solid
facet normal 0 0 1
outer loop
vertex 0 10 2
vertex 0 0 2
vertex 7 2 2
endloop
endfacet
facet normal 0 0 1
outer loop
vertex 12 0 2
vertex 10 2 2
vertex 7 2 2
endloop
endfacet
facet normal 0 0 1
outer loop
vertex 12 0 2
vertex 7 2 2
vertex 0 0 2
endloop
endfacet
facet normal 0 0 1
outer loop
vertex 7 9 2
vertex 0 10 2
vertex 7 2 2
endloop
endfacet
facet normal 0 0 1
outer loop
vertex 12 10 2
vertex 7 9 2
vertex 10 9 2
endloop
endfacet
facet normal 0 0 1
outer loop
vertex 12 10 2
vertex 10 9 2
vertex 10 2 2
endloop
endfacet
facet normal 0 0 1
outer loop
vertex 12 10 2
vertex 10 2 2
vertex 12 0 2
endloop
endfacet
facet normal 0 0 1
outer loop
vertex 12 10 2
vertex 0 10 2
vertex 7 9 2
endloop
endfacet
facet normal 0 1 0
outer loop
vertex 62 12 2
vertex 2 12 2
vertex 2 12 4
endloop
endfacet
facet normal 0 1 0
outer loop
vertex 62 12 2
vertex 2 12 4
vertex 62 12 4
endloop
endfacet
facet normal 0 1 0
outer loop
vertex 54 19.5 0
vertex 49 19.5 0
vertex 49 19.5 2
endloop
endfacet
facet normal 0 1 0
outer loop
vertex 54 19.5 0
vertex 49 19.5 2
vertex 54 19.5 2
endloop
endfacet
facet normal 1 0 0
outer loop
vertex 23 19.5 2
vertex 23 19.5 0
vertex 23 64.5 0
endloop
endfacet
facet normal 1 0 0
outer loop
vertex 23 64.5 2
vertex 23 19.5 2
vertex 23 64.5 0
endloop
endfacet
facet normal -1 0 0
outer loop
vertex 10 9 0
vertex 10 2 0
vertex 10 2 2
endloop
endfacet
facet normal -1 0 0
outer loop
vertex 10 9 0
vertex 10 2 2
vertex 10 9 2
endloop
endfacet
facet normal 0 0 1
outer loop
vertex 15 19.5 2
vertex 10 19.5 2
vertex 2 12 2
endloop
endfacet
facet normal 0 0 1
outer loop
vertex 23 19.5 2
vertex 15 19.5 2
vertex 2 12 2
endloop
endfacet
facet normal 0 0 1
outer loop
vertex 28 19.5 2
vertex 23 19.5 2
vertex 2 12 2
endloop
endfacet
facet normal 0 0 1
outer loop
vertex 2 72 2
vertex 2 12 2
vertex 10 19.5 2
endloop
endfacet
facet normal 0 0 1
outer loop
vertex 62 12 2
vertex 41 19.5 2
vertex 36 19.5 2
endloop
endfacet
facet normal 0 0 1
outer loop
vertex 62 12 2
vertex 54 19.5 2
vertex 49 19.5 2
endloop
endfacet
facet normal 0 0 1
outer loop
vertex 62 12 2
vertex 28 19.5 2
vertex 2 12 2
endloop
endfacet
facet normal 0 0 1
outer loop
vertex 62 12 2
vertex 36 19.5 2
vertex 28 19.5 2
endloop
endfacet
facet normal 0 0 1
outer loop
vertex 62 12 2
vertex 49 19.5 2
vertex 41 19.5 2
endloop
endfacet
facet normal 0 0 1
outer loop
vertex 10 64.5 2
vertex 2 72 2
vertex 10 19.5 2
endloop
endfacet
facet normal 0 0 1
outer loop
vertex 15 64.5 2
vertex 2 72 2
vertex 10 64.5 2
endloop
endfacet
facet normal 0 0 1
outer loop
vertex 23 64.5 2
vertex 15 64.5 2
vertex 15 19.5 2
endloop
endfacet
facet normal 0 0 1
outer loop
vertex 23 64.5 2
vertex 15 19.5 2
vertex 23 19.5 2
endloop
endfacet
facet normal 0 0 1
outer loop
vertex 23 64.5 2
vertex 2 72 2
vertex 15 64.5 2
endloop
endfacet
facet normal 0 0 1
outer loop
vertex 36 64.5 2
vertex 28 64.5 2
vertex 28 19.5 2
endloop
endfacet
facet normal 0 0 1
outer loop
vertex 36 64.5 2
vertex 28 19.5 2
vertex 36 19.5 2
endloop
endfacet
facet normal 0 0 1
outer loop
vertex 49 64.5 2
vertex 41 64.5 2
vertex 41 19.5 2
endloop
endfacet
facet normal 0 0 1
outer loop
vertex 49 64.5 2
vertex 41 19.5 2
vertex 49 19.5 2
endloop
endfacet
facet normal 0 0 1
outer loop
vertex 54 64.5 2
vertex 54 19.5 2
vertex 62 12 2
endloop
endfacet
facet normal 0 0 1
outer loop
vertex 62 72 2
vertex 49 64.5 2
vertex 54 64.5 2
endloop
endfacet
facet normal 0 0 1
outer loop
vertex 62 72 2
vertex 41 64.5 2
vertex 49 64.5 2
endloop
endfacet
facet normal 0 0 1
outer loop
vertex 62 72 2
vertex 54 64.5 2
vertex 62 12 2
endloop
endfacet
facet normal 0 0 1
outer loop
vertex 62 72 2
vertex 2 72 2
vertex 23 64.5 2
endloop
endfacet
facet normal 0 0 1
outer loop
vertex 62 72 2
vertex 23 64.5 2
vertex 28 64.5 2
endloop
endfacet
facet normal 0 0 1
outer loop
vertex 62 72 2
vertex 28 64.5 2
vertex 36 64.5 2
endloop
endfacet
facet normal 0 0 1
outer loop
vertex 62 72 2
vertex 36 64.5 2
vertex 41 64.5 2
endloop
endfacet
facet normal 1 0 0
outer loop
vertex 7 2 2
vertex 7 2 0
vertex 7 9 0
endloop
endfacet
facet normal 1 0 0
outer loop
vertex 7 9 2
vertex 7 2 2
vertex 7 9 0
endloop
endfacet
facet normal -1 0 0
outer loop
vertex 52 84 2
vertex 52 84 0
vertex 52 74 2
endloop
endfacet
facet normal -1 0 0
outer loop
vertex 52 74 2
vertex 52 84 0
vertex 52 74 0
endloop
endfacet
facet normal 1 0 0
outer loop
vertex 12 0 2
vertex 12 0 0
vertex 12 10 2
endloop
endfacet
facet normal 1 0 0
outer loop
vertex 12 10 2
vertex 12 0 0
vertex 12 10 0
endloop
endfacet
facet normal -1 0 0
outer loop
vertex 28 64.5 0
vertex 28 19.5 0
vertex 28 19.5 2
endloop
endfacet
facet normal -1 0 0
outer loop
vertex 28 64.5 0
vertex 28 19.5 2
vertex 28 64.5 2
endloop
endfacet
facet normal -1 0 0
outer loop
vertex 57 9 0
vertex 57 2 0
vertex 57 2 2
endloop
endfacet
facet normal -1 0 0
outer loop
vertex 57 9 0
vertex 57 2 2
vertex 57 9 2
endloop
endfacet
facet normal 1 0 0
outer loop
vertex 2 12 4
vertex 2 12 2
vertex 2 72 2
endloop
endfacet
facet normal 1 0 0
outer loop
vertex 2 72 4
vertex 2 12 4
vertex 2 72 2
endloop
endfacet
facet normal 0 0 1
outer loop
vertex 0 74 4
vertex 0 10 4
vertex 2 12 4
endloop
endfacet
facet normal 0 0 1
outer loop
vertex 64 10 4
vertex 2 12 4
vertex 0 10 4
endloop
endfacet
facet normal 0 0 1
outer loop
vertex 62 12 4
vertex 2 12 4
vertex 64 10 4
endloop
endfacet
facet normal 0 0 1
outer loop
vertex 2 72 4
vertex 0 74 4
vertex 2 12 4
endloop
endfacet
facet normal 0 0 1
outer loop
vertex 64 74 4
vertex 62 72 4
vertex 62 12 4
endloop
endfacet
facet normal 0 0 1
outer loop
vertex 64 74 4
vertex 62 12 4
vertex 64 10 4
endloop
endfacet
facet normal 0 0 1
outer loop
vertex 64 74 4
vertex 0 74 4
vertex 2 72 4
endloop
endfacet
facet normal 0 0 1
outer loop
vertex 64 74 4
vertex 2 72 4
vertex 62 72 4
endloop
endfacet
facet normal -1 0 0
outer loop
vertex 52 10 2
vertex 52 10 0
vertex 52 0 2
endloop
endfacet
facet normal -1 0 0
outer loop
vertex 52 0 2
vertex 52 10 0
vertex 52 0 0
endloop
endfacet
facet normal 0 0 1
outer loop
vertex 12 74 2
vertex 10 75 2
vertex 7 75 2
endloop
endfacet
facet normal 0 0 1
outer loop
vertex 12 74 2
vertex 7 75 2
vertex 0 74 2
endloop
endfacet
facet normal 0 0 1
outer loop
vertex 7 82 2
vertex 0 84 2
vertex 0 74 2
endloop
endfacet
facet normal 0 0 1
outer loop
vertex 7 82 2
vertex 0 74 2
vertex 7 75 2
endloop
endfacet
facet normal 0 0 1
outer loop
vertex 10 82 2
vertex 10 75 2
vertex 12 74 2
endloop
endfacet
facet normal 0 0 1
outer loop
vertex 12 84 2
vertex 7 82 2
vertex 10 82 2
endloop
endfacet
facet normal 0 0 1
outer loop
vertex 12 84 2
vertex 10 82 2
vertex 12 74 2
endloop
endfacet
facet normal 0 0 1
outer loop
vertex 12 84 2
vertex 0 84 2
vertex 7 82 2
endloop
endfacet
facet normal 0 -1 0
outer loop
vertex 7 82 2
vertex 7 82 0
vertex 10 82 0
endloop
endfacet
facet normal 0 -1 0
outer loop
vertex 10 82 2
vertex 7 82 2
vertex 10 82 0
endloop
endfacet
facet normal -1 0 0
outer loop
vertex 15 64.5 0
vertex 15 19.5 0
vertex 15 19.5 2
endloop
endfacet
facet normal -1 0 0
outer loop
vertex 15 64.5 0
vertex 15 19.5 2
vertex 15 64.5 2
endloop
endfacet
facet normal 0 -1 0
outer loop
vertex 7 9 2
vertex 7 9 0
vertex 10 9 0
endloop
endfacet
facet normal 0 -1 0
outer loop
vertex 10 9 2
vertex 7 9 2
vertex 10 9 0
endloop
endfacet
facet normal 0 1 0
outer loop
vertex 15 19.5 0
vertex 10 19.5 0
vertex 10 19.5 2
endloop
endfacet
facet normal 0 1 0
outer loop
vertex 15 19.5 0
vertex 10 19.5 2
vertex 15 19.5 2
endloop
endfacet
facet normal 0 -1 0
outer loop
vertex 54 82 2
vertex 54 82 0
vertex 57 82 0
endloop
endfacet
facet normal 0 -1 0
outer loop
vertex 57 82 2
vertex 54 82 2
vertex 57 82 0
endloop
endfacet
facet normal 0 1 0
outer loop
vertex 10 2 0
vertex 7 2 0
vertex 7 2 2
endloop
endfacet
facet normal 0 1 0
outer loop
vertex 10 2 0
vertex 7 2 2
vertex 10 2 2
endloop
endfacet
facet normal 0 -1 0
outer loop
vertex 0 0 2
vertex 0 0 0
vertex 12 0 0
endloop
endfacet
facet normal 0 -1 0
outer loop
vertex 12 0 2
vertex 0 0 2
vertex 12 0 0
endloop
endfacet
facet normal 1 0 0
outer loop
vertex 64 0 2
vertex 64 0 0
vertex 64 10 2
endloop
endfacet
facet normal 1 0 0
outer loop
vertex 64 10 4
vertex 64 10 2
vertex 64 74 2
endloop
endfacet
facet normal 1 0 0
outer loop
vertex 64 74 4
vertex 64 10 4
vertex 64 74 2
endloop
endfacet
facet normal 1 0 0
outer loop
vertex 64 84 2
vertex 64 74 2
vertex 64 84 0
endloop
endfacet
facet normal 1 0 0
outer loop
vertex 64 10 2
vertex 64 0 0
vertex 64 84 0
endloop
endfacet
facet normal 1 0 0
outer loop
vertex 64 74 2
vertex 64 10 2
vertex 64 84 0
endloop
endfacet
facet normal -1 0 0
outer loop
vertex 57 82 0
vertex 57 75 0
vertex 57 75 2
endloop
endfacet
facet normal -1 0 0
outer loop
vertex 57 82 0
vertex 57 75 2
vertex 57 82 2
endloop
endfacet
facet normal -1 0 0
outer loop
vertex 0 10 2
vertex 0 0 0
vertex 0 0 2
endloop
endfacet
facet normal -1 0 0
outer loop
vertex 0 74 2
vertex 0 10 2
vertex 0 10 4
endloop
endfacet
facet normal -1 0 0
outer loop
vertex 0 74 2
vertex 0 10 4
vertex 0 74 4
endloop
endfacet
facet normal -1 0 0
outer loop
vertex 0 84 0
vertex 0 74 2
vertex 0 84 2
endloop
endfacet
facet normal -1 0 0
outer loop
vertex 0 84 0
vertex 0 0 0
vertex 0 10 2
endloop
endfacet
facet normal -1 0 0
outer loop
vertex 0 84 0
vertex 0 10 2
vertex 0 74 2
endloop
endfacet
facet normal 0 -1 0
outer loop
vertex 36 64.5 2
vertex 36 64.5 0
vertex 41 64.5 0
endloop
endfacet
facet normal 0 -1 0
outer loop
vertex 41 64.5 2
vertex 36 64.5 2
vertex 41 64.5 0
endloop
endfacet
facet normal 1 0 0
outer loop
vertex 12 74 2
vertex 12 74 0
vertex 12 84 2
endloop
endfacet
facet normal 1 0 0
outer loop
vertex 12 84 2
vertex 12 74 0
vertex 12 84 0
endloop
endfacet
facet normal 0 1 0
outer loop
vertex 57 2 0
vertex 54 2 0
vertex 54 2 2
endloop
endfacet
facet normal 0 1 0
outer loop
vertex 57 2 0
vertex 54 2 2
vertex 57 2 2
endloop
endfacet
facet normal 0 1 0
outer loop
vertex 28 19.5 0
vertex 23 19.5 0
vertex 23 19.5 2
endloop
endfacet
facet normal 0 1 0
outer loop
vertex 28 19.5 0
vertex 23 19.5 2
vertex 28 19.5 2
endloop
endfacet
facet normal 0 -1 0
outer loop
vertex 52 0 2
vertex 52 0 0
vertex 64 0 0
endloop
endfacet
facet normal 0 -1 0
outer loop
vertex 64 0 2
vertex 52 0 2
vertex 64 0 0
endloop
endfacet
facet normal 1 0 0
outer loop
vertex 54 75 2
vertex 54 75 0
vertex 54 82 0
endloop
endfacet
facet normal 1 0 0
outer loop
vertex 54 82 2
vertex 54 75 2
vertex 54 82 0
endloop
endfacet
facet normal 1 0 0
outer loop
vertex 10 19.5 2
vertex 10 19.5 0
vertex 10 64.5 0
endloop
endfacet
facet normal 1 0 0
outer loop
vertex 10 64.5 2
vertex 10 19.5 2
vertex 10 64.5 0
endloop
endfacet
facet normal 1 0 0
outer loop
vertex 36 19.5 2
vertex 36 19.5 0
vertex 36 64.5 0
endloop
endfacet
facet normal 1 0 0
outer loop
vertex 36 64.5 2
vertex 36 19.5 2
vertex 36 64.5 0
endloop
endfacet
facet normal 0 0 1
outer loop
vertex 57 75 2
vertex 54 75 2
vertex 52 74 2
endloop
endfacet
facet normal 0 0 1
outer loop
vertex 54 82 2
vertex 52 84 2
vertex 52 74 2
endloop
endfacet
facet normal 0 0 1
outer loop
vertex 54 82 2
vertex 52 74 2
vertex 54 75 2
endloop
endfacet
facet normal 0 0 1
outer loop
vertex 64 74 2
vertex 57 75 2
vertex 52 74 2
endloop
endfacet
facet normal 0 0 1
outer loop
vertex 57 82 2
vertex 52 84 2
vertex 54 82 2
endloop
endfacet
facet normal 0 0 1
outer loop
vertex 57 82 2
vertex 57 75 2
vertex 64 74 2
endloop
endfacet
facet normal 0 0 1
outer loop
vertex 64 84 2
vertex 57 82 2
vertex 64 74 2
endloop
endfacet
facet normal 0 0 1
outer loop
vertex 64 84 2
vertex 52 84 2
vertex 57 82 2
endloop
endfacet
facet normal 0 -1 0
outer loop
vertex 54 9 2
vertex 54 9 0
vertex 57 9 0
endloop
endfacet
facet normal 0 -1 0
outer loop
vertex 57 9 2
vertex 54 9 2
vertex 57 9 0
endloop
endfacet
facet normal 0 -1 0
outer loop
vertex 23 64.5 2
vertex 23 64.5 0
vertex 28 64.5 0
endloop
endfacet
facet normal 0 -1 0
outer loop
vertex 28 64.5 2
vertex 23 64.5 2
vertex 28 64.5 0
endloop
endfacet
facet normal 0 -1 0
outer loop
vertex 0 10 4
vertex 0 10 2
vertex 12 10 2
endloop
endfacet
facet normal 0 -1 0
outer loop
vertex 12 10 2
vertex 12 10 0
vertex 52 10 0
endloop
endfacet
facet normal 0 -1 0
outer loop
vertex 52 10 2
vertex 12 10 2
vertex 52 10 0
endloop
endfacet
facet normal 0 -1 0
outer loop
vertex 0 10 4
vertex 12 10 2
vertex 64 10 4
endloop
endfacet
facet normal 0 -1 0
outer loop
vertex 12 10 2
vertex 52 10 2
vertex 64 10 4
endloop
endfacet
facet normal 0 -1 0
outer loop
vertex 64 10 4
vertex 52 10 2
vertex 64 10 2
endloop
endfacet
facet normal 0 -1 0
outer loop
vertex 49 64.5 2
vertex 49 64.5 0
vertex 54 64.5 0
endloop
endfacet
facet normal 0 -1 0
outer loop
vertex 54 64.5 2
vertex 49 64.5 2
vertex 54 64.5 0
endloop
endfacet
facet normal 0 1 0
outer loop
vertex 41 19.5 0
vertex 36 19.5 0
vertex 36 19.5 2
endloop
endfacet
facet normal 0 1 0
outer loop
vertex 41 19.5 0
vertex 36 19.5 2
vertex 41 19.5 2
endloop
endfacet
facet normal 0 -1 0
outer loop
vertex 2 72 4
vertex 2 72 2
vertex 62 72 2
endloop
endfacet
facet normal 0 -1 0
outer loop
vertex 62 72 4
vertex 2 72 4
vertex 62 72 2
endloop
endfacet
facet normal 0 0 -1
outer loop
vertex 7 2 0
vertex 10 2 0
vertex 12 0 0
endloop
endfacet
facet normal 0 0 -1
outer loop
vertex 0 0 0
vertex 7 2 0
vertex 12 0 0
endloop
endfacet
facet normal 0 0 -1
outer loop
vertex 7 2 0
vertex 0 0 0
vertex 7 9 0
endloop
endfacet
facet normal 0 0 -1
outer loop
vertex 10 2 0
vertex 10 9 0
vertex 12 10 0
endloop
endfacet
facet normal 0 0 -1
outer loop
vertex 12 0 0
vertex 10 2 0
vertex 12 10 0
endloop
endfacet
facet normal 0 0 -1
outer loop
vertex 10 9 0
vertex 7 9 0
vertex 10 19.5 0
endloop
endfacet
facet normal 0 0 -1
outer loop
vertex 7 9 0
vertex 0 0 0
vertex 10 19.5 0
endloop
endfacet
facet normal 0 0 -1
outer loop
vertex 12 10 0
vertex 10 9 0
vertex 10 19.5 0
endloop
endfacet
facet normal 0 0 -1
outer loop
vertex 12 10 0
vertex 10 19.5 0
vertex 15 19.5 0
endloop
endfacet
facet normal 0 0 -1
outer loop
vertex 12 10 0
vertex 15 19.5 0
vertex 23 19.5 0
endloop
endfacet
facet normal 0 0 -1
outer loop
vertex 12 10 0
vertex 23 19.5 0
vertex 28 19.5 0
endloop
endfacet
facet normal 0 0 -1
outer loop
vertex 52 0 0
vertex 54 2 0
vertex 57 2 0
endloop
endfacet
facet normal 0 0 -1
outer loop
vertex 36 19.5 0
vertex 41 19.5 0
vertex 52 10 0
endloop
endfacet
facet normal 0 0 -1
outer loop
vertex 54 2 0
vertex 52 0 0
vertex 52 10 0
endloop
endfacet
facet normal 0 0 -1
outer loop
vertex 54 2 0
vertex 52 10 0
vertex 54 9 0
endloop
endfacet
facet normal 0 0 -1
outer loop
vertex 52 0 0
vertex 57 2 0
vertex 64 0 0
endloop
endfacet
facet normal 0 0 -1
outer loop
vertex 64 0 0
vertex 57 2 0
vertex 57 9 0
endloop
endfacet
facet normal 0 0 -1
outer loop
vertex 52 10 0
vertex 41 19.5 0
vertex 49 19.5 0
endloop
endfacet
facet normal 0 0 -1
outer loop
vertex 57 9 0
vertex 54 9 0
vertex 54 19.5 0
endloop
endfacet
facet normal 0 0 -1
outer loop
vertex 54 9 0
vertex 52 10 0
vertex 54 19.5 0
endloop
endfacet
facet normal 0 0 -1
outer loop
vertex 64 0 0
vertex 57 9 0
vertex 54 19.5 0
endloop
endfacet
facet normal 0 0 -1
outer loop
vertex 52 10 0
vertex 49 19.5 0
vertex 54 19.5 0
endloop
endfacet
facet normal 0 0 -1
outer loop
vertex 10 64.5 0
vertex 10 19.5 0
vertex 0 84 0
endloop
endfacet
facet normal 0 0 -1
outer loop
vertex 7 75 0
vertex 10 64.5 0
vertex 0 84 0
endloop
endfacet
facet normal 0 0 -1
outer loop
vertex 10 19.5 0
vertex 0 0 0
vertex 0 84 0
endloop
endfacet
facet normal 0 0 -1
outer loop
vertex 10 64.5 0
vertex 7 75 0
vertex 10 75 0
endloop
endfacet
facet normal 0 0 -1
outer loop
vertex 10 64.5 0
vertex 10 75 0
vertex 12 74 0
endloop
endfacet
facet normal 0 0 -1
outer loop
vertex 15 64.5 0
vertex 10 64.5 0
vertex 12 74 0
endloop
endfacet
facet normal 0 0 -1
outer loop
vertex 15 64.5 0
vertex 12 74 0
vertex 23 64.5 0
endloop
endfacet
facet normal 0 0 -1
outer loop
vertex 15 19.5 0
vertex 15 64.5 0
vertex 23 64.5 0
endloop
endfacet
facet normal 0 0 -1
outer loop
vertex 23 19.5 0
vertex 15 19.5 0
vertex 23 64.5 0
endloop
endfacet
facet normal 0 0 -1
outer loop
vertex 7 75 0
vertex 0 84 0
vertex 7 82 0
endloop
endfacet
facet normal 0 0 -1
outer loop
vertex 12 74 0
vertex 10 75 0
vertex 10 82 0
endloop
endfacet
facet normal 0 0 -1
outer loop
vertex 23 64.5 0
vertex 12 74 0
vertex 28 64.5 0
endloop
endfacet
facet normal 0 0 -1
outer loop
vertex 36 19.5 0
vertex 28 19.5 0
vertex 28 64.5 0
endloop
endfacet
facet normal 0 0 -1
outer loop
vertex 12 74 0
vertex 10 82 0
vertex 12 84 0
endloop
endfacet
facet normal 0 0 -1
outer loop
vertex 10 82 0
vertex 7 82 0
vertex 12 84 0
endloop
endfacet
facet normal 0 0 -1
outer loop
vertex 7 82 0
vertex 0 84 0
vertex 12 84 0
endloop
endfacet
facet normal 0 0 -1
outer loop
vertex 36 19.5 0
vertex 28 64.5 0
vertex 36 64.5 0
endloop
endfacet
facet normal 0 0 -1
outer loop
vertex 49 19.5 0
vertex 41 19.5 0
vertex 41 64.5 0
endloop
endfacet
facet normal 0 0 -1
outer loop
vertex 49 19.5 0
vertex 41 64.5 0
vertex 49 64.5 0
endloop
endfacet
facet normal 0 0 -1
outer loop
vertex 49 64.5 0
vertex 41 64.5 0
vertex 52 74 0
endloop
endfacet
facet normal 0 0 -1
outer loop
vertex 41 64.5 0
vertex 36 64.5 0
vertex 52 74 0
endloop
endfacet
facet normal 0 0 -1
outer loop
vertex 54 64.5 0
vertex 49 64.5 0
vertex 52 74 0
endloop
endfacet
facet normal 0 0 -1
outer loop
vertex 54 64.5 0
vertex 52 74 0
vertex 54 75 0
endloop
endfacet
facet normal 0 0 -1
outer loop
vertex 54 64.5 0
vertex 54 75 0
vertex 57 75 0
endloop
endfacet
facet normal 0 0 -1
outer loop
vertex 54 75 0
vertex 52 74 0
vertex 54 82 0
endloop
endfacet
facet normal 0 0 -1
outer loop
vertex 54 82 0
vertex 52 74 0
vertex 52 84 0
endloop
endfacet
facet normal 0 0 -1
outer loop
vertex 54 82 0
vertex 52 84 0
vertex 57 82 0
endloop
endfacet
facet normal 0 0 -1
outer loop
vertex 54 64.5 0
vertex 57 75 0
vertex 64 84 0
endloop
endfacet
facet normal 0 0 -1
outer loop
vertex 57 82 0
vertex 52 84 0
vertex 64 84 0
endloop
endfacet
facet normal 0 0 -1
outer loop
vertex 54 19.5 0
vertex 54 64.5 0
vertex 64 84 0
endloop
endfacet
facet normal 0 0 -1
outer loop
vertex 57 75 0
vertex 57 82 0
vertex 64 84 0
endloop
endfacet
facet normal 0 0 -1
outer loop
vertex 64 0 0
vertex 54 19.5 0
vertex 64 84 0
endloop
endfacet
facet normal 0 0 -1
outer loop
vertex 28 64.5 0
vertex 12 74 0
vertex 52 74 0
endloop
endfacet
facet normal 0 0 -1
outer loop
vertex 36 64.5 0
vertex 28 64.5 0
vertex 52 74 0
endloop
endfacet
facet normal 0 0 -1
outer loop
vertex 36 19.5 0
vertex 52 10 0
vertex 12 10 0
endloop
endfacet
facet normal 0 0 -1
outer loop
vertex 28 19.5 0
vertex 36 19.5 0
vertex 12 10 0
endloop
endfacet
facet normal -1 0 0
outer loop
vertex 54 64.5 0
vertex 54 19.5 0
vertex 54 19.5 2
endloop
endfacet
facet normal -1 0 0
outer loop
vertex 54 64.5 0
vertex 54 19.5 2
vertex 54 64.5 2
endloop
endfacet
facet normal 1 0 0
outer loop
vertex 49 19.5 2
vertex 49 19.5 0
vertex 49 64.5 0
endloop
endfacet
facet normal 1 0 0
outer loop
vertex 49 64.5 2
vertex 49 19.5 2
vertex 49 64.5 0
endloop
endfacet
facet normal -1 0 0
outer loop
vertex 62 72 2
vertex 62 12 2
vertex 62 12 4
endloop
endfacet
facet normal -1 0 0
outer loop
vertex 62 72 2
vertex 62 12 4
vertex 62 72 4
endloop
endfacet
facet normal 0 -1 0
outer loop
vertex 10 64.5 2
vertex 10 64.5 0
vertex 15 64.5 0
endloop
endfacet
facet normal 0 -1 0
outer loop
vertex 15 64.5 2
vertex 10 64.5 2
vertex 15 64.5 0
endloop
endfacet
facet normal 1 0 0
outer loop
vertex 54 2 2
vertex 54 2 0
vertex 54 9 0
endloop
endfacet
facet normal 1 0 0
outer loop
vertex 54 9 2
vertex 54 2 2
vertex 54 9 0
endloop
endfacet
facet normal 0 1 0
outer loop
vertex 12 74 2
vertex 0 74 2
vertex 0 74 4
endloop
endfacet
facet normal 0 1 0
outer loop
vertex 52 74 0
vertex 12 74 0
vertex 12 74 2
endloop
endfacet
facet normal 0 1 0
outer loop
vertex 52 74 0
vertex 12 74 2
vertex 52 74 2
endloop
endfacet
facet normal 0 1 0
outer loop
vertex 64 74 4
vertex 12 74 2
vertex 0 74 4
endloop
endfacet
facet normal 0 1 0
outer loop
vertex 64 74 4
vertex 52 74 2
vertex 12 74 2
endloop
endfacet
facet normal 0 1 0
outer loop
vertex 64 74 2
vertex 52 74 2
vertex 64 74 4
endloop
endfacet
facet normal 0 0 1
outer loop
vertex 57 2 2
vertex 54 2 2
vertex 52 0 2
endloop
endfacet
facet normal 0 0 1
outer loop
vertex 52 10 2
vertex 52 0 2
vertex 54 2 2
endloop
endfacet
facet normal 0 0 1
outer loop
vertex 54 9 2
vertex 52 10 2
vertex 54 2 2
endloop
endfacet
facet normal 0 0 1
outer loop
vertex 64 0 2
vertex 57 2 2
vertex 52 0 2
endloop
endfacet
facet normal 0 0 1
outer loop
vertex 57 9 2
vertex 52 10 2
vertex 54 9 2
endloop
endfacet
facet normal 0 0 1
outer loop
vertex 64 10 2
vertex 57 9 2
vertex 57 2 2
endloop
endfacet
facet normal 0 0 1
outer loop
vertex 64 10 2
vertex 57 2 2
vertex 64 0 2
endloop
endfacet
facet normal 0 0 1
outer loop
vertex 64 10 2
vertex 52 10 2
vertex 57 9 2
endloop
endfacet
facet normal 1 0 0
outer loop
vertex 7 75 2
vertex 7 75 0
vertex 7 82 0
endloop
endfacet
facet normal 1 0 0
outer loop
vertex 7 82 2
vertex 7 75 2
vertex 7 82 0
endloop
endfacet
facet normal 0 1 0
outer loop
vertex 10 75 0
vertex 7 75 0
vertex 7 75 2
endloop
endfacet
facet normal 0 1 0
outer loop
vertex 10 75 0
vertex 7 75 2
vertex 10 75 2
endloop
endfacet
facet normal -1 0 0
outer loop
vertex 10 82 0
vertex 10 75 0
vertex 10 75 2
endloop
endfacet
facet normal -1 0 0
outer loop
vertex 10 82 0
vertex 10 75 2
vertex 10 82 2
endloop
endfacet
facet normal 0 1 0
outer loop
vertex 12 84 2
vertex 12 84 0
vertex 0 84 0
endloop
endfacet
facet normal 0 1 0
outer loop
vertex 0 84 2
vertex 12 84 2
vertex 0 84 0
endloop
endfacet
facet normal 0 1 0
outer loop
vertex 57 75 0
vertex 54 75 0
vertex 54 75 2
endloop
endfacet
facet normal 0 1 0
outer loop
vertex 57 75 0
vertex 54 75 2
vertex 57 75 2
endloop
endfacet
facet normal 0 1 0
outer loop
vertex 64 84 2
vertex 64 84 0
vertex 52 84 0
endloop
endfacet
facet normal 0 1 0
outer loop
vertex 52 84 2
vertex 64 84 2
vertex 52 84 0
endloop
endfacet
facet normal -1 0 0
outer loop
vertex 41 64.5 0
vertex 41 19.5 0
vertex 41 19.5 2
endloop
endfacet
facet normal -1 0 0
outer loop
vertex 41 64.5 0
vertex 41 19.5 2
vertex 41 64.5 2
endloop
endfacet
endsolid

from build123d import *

# Parameters (mm, degrees)
SKETCH_W      = 5
SKETCH_H      = 45
SKETCH_W_2    = 3
SKETCH_H_2    = 7
PAD_DEPTH     = 2
SKETCH006_W   = 64
SKETCH006_H   = 64
SKETCH006_W_2 = 60
SKETCH006_H_2 = 60
PAD001_DEPTH  = 2


with BuildPart() as part:
    # Sketch → Pad (new body)
    with BuildSketch(Plane.XY):
        Polygon((64, 0), (64, 84), (52, 84), (52, 74), (12, 74), (12, 84), (0, 84), (0, 0), (12, 0), (12, 10), (52, 10), (52, 0), align=None)
        with Locations((12.5, 42)):
            Rectangle(SKETCH_W, SKETCH_H, mode=Mode.SUBTRACT)
        with Locations((25.5, 42)):
            Rectangle(SKETCH_W, SKETCH_H, mode=Mode.SUBTRACT)
        with Locations((38.5, 42)):
            Rectangle(SKETCH_W, SKETCH_H, mode=Mode.SUBTRACT)
        with Locations((51.5, 42)):
            Rectangle(SKETCH_W, SKETCH_H, mode=Mode.SUBTRACT)
        with Locations((8.5, 78.5)):
            Rectangle(SKETCH_W_2, SKETCH_H_2, mode=Mode.SUBTRACT)
        with Locations((55.5, 78.5)):
            Rectangle(SKETCH_W_2, SKETCH_H_2, mode=Mode.SUBTRACT)
        with Locations((55.5, 5.5)):
            Rectangle(SKETCH_W_2, SKETCH_H_2, mode=Mode.SUBTRACT)
        with Locations((8.5, 5.5)):
            Rectangle(SKETCH_W_2, SKETCH_H_2, mode=Mode.SUBTRACT)
    extrude(amount=PAD_DEPTH)

    # Sketch006 → Pad001 (join)
    with BuildSketch(Plane.XY.offset(2)):
        with Locations((32, 42)):
            Rectangle(SKETCH006_W, SKETCH006_H)
        with Locations((32, 42)):
            Rectangle(SKETCH006_W_2, SKETCH006_H_2, mode=Mode.SUBTRACT)
    extrude(amount=PAD001_DEPTH)


solid = part.part
